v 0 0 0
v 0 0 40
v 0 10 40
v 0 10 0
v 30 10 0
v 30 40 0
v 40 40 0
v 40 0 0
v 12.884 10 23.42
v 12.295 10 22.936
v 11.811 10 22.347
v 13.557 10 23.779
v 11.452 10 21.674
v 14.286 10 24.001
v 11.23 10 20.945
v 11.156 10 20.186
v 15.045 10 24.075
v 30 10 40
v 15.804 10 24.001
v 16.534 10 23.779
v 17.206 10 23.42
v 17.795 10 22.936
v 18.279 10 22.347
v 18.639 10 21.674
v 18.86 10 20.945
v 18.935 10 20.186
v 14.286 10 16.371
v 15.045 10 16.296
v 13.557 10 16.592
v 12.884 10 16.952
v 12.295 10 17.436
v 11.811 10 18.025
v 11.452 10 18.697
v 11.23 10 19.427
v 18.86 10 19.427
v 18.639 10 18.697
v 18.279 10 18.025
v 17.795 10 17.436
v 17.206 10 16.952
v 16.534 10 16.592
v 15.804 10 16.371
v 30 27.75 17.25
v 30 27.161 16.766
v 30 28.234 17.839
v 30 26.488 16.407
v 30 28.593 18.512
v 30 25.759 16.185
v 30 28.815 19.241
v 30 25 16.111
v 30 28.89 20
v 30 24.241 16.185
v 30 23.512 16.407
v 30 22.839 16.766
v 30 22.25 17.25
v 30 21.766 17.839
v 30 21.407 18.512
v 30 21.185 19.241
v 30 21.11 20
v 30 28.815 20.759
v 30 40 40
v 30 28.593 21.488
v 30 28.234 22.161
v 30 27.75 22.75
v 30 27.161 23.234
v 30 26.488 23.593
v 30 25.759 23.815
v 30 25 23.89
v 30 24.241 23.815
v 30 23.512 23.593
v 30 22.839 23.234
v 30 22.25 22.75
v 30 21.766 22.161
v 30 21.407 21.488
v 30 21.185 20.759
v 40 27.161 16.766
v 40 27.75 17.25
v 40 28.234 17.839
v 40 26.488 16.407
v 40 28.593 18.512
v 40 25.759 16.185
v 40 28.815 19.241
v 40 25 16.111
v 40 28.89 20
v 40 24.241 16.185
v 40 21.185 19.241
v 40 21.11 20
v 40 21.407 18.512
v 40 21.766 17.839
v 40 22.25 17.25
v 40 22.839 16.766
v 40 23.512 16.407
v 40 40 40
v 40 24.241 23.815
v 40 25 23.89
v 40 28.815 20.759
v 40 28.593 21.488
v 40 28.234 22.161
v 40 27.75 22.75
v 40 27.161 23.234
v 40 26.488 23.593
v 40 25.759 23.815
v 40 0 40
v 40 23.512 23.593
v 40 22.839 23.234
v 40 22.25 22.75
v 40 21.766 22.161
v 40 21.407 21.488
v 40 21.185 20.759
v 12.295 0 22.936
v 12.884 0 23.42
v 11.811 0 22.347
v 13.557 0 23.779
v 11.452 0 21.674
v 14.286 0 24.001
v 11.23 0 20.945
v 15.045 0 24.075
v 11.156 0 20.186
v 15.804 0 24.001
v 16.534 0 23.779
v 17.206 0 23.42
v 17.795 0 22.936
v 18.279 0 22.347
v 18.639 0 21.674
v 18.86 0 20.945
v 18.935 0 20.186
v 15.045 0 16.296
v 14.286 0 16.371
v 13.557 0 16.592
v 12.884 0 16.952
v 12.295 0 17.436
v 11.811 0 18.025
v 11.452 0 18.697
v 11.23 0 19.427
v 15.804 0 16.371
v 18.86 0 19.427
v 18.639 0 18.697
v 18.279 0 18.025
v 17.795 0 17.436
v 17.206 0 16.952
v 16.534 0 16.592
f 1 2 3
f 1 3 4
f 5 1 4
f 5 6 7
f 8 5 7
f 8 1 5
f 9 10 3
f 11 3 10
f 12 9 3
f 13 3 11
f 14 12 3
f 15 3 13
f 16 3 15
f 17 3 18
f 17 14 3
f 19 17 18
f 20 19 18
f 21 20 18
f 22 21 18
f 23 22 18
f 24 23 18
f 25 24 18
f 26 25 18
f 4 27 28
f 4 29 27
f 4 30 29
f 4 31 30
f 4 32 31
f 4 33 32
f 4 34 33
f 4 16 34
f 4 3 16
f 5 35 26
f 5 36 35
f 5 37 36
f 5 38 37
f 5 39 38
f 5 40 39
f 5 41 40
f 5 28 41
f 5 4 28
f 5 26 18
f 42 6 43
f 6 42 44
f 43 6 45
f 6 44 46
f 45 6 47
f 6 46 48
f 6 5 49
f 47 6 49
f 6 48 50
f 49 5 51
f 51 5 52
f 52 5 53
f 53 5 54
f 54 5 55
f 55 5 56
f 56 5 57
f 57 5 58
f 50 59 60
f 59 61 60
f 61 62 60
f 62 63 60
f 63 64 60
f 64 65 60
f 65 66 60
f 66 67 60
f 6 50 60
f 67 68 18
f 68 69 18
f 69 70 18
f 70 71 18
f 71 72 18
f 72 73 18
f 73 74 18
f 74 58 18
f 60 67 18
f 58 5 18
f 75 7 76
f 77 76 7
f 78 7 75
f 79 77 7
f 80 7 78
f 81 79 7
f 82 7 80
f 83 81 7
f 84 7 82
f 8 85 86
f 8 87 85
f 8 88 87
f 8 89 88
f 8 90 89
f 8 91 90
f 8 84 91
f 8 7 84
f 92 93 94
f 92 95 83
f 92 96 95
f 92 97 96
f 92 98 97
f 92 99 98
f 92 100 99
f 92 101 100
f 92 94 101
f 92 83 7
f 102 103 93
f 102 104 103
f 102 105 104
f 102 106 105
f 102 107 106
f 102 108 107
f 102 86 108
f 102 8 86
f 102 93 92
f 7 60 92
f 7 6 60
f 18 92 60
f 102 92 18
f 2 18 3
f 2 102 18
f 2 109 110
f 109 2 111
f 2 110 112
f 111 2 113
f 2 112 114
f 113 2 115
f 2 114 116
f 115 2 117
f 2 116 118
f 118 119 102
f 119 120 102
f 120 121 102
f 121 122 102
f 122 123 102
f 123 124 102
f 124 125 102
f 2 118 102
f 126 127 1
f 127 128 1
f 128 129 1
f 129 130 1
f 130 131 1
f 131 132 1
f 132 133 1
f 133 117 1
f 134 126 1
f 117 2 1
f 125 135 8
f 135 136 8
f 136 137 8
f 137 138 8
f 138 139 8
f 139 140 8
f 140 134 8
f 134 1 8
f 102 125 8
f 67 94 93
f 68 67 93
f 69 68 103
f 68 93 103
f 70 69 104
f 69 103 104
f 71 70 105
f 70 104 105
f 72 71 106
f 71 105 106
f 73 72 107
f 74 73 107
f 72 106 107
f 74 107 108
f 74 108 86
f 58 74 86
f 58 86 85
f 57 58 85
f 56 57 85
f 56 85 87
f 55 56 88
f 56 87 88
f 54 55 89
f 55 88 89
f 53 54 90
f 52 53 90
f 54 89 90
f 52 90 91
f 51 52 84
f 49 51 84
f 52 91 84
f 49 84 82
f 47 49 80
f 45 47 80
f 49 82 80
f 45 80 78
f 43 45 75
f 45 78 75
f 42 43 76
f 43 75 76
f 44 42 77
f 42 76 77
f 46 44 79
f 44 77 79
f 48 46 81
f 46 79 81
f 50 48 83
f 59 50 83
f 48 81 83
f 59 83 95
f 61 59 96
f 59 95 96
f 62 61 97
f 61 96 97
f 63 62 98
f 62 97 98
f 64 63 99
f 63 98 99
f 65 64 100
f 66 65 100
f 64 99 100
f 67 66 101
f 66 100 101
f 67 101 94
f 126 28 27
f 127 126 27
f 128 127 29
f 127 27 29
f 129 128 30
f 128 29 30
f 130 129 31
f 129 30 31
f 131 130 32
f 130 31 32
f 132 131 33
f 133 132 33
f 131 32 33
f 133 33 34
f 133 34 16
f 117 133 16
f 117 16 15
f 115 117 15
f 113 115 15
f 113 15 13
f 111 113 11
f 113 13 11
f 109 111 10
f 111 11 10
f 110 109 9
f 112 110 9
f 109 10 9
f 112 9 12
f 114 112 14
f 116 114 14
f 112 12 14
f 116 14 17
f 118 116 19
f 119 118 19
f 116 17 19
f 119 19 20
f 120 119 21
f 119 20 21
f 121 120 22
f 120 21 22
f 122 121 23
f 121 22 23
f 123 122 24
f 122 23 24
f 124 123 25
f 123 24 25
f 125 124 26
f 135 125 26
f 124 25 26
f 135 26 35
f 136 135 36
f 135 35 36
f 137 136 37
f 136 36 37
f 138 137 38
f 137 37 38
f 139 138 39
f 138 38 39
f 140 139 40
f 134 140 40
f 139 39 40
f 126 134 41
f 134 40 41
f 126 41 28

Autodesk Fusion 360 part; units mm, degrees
sketch "Eskiz1" plane through (0, 0, 0) normal (0, 1, 0) x (1, 0, 0)
  circle A0 centre (15, -20) radius 4.5
  line L0 (0, 0) -> (30, 0)
  line L1 (30, 0) -> (30, -40)
  line L2 (30, -40) -> (0, -40)
  line L3 (0, -40) -> (0, 0)
  line L4 (30, 0) -> (40, 0)
  line L5 (40, 0) -> (40, -40)
  line L6 (40, -40) -> (30, -40)
  line L7 (30, -40) -> (30, 0)
  dimension "d3" = 9
  dimension "d13" = 40
  dimension "d25" = 10
  dimension "d31" = 30
extrude "Ekstrüde Et9" add sketch "Eskiz1" along normal blind 10 contours A0 | L0 L1 L2 L3 L7
extrude "Ekstrüde Et10" add sketch "Eskiz1" along normal blind 40 contours L1 L4 L5 L6 L7
sketch "Eskiz4" plane through (30, 0, 0) normal (-1, 0, 0) x (0, 0, 1)
  line L0 (0, 10) -> (40, 10)
  line L1 (40, 10) -> (40, 40)
  line L2 (40, 40) -> (0, 40)
  line L3 (0, 40) -> (0, 10)
  circle A0 centre (20, 25) radius 4.5
  dimension "d36" = 9
  dimension "d37" = 15
hole "Delik1" at (15.0452, 0, 20.1858) direction (0, 1, 0) diameter 7.779 depth 18 tip angle 118
hole "Delik2" at (30, 25, 20) direction (1, 0, 0) diameter 7.779 depth 18 tip angle 118
